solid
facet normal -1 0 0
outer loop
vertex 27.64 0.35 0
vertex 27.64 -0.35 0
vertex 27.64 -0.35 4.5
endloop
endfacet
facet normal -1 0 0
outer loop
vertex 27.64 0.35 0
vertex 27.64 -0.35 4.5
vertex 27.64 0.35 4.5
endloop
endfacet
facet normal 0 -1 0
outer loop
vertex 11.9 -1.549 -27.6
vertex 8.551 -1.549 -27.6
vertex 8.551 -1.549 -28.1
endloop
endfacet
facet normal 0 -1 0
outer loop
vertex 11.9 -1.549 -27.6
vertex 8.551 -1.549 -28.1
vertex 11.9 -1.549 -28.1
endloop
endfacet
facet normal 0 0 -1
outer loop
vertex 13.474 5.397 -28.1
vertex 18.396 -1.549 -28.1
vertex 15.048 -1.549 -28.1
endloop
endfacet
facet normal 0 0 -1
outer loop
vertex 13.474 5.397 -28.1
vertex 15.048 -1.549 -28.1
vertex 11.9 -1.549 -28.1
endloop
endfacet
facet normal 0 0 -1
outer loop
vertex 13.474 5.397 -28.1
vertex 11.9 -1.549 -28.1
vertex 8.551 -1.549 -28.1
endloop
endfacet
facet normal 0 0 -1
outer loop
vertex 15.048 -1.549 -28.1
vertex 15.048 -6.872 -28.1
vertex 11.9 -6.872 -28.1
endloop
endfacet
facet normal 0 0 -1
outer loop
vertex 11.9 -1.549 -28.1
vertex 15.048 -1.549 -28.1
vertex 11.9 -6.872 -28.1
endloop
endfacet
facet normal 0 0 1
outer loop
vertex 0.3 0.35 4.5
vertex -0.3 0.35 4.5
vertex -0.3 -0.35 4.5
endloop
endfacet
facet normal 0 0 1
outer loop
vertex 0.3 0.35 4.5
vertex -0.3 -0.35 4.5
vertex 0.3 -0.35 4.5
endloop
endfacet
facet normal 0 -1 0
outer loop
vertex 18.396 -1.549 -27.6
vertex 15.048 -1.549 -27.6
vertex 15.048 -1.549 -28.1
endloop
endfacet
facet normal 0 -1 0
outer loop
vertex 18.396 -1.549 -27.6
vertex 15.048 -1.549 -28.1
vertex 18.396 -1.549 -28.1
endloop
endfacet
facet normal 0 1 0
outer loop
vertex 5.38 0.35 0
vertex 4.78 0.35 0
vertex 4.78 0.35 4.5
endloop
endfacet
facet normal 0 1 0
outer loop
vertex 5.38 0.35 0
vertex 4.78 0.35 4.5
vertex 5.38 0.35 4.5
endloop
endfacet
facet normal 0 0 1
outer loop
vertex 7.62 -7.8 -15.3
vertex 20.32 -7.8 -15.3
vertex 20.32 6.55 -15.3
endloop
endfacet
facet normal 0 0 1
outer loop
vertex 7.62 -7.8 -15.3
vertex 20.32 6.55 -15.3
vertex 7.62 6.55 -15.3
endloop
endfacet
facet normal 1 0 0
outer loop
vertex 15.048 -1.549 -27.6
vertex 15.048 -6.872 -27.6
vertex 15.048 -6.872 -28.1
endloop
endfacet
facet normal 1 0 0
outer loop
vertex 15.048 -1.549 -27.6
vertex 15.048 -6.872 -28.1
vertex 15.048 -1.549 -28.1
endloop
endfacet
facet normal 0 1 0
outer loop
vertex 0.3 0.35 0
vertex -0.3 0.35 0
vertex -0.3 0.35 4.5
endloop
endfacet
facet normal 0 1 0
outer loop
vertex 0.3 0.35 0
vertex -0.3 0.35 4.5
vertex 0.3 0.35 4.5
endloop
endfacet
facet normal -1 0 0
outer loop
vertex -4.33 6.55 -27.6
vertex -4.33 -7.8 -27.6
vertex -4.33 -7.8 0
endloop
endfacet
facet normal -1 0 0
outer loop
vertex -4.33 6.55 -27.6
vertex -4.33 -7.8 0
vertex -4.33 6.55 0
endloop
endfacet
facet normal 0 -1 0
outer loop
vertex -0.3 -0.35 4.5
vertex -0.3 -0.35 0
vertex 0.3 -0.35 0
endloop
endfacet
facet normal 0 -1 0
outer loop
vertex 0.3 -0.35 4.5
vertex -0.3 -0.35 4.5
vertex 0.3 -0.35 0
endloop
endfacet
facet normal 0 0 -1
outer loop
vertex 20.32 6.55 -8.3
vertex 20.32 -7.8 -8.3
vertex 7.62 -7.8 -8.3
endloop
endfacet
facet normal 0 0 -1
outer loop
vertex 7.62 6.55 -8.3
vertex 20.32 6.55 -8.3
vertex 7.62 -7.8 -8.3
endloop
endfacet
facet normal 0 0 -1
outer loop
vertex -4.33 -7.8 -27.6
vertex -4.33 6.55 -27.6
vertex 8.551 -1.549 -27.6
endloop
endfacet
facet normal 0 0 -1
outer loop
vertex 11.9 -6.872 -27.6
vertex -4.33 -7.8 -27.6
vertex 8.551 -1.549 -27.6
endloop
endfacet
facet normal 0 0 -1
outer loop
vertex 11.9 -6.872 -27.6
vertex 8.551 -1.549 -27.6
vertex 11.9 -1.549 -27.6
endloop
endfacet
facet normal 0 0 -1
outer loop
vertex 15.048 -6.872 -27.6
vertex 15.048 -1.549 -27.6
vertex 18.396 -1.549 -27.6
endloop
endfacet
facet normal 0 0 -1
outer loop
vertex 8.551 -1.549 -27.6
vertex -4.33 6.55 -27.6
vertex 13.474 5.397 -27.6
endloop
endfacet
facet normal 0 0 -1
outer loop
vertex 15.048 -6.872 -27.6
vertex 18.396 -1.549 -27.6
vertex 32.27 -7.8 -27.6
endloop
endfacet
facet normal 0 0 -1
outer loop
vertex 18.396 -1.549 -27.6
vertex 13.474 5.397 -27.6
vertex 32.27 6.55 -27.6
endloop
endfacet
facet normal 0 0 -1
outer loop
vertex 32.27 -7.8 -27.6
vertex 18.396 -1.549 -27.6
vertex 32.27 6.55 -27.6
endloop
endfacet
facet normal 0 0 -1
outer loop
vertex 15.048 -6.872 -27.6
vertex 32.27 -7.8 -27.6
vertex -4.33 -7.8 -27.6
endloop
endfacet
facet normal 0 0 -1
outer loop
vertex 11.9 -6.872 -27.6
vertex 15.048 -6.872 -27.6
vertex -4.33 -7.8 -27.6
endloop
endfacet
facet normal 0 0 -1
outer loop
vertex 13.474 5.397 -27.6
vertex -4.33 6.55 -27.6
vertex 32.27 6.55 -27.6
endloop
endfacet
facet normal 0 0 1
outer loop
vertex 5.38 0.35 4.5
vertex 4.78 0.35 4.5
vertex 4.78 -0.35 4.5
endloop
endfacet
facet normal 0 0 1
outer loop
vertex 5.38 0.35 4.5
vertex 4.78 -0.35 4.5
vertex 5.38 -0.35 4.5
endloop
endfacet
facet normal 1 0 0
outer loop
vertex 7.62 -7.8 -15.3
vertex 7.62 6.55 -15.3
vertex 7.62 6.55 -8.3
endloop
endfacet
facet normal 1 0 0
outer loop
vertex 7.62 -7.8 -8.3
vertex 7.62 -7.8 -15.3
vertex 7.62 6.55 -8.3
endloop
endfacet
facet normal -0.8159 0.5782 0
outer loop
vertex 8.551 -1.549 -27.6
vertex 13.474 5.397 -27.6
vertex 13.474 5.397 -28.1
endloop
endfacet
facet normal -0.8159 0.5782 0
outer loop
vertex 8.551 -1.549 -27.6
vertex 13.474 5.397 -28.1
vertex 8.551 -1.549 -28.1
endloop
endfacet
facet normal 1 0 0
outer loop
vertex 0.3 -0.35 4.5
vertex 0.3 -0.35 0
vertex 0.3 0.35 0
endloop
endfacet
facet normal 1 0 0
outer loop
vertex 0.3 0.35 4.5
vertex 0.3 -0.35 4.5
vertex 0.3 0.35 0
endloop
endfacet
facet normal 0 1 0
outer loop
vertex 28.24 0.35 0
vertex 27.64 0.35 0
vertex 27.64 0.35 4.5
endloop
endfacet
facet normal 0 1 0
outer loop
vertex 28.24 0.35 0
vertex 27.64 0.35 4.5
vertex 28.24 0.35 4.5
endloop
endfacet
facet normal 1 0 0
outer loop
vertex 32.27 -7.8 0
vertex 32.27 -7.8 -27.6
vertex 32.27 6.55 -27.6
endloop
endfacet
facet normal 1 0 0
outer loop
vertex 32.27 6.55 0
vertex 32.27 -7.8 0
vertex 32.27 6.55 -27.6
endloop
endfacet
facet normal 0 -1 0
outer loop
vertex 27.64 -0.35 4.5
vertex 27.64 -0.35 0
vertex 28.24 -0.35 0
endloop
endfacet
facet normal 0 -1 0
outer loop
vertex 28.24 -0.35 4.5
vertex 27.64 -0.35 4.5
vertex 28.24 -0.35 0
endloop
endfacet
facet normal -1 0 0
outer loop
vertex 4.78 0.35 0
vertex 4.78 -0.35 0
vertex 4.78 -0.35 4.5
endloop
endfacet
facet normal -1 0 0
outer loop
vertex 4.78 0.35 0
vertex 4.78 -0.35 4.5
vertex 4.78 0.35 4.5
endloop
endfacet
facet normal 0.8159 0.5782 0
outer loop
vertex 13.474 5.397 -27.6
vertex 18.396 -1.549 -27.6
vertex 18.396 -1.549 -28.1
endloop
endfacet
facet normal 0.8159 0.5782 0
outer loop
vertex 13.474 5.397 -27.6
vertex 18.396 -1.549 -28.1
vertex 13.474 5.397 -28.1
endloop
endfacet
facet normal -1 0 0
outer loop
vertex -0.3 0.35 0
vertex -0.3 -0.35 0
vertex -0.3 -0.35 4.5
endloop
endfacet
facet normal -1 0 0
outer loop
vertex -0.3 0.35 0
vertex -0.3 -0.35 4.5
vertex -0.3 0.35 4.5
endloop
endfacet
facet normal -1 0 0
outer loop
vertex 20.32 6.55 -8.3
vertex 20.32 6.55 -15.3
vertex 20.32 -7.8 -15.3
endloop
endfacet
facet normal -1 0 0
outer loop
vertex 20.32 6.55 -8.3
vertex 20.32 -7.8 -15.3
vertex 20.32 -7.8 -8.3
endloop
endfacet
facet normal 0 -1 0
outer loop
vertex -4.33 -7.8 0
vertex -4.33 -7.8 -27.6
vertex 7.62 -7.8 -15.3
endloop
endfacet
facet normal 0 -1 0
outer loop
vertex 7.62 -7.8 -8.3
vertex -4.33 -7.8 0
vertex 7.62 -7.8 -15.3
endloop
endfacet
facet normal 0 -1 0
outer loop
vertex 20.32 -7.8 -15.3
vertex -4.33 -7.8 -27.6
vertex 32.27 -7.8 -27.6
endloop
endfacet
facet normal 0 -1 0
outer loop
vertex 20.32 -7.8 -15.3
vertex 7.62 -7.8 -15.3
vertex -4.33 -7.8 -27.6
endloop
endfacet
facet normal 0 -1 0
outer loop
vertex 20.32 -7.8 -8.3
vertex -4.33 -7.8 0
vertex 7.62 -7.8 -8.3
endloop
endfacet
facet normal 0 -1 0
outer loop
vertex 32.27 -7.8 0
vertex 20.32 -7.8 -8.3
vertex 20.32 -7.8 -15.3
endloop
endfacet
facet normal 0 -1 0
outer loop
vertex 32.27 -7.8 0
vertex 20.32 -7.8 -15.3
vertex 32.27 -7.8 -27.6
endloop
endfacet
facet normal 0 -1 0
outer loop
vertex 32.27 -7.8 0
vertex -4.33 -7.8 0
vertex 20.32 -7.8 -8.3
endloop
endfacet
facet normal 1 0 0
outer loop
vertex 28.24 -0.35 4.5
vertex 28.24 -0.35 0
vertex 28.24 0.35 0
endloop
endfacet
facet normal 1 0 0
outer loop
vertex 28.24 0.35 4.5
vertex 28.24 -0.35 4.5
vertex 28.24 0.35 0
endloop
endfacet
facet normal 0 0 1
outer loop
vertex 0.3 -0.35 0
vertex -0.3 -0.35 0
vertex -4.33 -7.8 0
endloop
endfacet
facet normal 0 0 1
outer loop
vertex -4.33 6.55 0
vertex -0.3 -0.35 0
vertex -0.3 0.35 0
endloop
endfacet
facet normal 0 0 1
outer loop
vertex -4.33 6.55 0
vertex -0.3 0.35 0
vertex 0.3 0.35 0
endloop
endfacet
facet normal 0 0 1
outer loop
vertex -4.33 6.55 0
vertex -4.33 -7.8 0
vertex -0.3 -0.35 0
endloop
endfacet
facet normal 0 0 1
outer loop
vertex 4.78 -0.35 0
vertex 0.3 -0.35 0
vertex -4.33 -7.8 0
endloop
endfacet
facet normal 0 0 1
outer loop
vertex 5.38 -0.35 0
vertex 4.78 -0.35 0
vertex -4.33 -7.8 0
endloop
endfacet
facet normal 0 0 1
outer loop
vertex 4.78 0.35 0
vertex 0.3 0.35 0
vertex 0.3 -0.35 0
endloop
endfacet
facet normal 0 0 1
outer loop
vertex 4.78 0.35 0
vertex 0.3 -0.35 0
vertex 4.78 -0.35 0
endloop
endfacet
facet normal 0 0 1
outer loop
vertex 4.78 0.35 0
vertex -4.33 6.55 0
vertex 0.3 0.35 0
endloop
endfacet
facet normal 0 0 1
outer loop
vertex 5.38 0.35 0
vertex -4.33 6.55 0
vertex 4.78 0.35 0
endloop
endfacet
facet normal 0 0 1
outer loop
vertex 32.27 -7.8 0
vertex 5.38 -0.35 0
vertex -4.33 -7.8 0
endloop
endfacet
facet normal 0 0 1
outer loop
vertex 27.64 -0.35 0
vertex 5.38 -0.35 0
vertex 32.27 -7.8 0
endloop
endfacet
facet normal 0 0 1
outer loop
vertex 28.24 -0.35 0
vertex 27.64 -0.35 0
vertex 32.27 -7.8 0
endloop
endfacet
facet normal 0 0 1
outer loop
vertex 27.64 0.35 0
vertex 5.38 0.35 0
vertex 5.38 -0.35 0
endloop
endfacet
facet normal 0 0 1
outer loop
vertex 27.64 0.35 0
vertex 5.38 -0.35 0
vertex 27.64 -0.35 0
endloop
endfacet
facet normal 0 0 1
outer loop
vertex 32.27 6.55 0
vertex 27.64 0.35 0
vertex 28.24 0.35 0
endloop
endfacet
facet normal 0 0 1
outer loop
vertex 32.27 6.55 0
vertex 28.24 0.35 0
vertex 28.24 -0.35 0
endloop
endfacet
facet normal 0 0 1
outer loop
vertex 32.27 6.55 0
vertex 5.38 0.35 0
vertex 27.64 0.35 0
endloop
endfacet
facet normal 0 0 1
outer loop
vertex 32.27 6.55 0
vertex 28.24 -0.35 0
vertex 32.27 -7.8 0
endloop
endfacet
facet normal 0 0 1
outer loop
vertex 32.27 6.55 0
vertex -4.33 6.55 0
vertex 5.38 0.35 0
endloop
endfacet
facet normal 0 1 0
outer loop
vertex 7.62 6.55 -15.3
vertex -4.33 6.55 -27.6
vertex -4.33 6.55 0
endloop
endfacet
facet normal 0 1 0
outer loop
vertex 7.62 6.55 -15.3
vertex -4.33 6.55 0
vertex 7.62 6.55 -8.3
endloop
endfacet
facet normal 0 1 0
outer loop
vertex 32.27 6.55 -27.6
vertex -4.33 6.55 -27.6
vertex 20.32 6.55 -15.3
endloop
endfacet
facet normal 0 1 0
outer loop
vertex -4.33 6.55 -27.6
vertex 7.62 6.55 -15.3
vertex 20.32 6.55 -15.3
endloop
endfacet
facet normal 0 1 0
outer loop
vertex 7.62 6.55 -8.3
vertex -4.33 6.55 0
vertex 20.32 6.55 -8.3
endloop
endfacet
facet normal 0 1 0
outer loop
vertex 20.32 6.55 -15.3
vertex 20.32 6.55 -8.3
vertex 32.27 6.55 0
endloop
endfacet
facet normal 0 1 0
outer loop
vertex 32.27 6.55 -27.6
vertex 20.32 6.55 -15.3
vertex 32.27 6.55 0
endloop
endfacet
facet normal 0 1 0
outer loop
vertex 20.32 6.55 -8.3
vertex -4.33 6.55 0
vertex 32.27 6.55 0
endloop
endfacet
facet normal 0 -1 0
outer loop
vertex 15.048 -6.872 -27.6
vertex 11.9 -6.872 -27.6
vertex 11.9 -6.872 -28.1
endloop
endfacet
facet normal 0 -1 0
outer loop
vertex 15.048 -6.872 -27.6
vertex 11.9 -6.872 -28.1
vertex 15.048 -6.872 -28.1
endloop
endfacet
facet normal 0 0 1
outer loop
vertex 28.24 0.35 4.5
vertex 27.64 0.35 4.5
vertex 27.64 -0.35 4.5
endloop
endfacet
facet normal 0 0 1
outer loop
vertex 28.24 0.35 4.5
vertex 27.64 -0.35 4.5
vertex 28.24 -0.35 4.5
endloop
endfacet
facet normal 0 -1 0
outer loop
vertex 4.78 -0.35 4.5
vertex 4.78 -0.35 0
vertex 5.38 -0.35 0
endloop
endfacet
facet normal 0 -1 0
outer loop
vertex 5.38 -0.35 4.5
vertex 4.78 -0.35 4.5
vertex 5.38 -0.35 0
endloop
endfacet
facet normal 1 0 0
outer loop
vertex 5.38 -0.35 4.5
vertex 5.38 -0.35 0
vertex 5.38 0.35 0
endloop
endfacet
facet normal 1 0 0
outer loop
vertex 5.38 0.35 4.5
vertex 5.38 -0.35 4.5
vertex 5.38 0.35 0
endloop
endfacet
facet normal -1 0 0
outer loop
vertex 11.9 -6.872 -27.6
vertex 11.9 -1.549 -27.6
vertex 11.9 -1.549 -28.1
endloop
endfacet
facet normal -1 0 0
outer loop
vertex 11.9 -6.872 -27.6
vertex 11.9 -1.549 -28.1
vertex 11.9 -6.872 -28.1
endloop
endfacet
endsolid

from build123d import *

# Parameters (mm, degrees)
SKETCH001_W      = 36.6
SKETCH001_H      = 14.35
EXTRUDE001_DEPTH = 27.6
SKETCH002_W      = 12.7
SKETCH002_H      = 7
POCKET_DEPTH     = 14.351
PAD_DEPTH        = 0.5
SKETCH_W         = 0.6
SKETCH_H         = 0.7
EXTRUDE_DEPTH    = 4.5


with BuildPart() as pad:
    # Sketch001 → Extrude001 (new body)
    with BuildSketch(Plane.XY):
        with Locations((13.97, -0.625)):
            Rectangle(SKETCH001_W, SKETCH001_H)
    extrude(amount=-EXTRUDE001_DEPTH)

    # Sketch002 → Pocket (cut, through all)
    with BuildSketch(Plane(origin=(0, 6.55, 0), x_dir=(-1, 0, 0), z_dir=(0, 1, 0))):
        with Locations((-13.97, -11.8)):
            Rectangle(SKETCH002_W, SKETCH002_H)
    extrude(amount=-POCKET_DEPTH, mode=Mode.SUBTRACT)

    # Sketch003 → Pad (new body)
    with BuildSketch(Plane(origin=(0, 0, -27.6), x_dir=(1, 0, 0), z_dir=(0, 0, -1))):
        Polygon((11.900003, 6.871569), (15.047757, 6.871569), (15.047757, 1.54931), (18.396286, 1.54931), (13.47388, -5.396754), (8.551474, 1.54931), (11.900003, 1.54931), align=None)
    extrude(amount=PAD_DEPTH)


with BuildPart() as fusion:
    # Sketch → Extrude (new body)
    with BuildSketch(Plane.XY):
        Rectangle(SKETCH_W, SKETCH_H)
        with Locations((5.08, 0)):
            Rectangle(SKETCH_W, SKETCH_H)
        with Locations((27.94, 0)):
            Rectangle(SKETCH_W, SKETCH_H)
    extrude(amount=EXTRUDE_DEPTH)

    # Fusion: union Pad
    add(pad.part)


solid = fusion.part
